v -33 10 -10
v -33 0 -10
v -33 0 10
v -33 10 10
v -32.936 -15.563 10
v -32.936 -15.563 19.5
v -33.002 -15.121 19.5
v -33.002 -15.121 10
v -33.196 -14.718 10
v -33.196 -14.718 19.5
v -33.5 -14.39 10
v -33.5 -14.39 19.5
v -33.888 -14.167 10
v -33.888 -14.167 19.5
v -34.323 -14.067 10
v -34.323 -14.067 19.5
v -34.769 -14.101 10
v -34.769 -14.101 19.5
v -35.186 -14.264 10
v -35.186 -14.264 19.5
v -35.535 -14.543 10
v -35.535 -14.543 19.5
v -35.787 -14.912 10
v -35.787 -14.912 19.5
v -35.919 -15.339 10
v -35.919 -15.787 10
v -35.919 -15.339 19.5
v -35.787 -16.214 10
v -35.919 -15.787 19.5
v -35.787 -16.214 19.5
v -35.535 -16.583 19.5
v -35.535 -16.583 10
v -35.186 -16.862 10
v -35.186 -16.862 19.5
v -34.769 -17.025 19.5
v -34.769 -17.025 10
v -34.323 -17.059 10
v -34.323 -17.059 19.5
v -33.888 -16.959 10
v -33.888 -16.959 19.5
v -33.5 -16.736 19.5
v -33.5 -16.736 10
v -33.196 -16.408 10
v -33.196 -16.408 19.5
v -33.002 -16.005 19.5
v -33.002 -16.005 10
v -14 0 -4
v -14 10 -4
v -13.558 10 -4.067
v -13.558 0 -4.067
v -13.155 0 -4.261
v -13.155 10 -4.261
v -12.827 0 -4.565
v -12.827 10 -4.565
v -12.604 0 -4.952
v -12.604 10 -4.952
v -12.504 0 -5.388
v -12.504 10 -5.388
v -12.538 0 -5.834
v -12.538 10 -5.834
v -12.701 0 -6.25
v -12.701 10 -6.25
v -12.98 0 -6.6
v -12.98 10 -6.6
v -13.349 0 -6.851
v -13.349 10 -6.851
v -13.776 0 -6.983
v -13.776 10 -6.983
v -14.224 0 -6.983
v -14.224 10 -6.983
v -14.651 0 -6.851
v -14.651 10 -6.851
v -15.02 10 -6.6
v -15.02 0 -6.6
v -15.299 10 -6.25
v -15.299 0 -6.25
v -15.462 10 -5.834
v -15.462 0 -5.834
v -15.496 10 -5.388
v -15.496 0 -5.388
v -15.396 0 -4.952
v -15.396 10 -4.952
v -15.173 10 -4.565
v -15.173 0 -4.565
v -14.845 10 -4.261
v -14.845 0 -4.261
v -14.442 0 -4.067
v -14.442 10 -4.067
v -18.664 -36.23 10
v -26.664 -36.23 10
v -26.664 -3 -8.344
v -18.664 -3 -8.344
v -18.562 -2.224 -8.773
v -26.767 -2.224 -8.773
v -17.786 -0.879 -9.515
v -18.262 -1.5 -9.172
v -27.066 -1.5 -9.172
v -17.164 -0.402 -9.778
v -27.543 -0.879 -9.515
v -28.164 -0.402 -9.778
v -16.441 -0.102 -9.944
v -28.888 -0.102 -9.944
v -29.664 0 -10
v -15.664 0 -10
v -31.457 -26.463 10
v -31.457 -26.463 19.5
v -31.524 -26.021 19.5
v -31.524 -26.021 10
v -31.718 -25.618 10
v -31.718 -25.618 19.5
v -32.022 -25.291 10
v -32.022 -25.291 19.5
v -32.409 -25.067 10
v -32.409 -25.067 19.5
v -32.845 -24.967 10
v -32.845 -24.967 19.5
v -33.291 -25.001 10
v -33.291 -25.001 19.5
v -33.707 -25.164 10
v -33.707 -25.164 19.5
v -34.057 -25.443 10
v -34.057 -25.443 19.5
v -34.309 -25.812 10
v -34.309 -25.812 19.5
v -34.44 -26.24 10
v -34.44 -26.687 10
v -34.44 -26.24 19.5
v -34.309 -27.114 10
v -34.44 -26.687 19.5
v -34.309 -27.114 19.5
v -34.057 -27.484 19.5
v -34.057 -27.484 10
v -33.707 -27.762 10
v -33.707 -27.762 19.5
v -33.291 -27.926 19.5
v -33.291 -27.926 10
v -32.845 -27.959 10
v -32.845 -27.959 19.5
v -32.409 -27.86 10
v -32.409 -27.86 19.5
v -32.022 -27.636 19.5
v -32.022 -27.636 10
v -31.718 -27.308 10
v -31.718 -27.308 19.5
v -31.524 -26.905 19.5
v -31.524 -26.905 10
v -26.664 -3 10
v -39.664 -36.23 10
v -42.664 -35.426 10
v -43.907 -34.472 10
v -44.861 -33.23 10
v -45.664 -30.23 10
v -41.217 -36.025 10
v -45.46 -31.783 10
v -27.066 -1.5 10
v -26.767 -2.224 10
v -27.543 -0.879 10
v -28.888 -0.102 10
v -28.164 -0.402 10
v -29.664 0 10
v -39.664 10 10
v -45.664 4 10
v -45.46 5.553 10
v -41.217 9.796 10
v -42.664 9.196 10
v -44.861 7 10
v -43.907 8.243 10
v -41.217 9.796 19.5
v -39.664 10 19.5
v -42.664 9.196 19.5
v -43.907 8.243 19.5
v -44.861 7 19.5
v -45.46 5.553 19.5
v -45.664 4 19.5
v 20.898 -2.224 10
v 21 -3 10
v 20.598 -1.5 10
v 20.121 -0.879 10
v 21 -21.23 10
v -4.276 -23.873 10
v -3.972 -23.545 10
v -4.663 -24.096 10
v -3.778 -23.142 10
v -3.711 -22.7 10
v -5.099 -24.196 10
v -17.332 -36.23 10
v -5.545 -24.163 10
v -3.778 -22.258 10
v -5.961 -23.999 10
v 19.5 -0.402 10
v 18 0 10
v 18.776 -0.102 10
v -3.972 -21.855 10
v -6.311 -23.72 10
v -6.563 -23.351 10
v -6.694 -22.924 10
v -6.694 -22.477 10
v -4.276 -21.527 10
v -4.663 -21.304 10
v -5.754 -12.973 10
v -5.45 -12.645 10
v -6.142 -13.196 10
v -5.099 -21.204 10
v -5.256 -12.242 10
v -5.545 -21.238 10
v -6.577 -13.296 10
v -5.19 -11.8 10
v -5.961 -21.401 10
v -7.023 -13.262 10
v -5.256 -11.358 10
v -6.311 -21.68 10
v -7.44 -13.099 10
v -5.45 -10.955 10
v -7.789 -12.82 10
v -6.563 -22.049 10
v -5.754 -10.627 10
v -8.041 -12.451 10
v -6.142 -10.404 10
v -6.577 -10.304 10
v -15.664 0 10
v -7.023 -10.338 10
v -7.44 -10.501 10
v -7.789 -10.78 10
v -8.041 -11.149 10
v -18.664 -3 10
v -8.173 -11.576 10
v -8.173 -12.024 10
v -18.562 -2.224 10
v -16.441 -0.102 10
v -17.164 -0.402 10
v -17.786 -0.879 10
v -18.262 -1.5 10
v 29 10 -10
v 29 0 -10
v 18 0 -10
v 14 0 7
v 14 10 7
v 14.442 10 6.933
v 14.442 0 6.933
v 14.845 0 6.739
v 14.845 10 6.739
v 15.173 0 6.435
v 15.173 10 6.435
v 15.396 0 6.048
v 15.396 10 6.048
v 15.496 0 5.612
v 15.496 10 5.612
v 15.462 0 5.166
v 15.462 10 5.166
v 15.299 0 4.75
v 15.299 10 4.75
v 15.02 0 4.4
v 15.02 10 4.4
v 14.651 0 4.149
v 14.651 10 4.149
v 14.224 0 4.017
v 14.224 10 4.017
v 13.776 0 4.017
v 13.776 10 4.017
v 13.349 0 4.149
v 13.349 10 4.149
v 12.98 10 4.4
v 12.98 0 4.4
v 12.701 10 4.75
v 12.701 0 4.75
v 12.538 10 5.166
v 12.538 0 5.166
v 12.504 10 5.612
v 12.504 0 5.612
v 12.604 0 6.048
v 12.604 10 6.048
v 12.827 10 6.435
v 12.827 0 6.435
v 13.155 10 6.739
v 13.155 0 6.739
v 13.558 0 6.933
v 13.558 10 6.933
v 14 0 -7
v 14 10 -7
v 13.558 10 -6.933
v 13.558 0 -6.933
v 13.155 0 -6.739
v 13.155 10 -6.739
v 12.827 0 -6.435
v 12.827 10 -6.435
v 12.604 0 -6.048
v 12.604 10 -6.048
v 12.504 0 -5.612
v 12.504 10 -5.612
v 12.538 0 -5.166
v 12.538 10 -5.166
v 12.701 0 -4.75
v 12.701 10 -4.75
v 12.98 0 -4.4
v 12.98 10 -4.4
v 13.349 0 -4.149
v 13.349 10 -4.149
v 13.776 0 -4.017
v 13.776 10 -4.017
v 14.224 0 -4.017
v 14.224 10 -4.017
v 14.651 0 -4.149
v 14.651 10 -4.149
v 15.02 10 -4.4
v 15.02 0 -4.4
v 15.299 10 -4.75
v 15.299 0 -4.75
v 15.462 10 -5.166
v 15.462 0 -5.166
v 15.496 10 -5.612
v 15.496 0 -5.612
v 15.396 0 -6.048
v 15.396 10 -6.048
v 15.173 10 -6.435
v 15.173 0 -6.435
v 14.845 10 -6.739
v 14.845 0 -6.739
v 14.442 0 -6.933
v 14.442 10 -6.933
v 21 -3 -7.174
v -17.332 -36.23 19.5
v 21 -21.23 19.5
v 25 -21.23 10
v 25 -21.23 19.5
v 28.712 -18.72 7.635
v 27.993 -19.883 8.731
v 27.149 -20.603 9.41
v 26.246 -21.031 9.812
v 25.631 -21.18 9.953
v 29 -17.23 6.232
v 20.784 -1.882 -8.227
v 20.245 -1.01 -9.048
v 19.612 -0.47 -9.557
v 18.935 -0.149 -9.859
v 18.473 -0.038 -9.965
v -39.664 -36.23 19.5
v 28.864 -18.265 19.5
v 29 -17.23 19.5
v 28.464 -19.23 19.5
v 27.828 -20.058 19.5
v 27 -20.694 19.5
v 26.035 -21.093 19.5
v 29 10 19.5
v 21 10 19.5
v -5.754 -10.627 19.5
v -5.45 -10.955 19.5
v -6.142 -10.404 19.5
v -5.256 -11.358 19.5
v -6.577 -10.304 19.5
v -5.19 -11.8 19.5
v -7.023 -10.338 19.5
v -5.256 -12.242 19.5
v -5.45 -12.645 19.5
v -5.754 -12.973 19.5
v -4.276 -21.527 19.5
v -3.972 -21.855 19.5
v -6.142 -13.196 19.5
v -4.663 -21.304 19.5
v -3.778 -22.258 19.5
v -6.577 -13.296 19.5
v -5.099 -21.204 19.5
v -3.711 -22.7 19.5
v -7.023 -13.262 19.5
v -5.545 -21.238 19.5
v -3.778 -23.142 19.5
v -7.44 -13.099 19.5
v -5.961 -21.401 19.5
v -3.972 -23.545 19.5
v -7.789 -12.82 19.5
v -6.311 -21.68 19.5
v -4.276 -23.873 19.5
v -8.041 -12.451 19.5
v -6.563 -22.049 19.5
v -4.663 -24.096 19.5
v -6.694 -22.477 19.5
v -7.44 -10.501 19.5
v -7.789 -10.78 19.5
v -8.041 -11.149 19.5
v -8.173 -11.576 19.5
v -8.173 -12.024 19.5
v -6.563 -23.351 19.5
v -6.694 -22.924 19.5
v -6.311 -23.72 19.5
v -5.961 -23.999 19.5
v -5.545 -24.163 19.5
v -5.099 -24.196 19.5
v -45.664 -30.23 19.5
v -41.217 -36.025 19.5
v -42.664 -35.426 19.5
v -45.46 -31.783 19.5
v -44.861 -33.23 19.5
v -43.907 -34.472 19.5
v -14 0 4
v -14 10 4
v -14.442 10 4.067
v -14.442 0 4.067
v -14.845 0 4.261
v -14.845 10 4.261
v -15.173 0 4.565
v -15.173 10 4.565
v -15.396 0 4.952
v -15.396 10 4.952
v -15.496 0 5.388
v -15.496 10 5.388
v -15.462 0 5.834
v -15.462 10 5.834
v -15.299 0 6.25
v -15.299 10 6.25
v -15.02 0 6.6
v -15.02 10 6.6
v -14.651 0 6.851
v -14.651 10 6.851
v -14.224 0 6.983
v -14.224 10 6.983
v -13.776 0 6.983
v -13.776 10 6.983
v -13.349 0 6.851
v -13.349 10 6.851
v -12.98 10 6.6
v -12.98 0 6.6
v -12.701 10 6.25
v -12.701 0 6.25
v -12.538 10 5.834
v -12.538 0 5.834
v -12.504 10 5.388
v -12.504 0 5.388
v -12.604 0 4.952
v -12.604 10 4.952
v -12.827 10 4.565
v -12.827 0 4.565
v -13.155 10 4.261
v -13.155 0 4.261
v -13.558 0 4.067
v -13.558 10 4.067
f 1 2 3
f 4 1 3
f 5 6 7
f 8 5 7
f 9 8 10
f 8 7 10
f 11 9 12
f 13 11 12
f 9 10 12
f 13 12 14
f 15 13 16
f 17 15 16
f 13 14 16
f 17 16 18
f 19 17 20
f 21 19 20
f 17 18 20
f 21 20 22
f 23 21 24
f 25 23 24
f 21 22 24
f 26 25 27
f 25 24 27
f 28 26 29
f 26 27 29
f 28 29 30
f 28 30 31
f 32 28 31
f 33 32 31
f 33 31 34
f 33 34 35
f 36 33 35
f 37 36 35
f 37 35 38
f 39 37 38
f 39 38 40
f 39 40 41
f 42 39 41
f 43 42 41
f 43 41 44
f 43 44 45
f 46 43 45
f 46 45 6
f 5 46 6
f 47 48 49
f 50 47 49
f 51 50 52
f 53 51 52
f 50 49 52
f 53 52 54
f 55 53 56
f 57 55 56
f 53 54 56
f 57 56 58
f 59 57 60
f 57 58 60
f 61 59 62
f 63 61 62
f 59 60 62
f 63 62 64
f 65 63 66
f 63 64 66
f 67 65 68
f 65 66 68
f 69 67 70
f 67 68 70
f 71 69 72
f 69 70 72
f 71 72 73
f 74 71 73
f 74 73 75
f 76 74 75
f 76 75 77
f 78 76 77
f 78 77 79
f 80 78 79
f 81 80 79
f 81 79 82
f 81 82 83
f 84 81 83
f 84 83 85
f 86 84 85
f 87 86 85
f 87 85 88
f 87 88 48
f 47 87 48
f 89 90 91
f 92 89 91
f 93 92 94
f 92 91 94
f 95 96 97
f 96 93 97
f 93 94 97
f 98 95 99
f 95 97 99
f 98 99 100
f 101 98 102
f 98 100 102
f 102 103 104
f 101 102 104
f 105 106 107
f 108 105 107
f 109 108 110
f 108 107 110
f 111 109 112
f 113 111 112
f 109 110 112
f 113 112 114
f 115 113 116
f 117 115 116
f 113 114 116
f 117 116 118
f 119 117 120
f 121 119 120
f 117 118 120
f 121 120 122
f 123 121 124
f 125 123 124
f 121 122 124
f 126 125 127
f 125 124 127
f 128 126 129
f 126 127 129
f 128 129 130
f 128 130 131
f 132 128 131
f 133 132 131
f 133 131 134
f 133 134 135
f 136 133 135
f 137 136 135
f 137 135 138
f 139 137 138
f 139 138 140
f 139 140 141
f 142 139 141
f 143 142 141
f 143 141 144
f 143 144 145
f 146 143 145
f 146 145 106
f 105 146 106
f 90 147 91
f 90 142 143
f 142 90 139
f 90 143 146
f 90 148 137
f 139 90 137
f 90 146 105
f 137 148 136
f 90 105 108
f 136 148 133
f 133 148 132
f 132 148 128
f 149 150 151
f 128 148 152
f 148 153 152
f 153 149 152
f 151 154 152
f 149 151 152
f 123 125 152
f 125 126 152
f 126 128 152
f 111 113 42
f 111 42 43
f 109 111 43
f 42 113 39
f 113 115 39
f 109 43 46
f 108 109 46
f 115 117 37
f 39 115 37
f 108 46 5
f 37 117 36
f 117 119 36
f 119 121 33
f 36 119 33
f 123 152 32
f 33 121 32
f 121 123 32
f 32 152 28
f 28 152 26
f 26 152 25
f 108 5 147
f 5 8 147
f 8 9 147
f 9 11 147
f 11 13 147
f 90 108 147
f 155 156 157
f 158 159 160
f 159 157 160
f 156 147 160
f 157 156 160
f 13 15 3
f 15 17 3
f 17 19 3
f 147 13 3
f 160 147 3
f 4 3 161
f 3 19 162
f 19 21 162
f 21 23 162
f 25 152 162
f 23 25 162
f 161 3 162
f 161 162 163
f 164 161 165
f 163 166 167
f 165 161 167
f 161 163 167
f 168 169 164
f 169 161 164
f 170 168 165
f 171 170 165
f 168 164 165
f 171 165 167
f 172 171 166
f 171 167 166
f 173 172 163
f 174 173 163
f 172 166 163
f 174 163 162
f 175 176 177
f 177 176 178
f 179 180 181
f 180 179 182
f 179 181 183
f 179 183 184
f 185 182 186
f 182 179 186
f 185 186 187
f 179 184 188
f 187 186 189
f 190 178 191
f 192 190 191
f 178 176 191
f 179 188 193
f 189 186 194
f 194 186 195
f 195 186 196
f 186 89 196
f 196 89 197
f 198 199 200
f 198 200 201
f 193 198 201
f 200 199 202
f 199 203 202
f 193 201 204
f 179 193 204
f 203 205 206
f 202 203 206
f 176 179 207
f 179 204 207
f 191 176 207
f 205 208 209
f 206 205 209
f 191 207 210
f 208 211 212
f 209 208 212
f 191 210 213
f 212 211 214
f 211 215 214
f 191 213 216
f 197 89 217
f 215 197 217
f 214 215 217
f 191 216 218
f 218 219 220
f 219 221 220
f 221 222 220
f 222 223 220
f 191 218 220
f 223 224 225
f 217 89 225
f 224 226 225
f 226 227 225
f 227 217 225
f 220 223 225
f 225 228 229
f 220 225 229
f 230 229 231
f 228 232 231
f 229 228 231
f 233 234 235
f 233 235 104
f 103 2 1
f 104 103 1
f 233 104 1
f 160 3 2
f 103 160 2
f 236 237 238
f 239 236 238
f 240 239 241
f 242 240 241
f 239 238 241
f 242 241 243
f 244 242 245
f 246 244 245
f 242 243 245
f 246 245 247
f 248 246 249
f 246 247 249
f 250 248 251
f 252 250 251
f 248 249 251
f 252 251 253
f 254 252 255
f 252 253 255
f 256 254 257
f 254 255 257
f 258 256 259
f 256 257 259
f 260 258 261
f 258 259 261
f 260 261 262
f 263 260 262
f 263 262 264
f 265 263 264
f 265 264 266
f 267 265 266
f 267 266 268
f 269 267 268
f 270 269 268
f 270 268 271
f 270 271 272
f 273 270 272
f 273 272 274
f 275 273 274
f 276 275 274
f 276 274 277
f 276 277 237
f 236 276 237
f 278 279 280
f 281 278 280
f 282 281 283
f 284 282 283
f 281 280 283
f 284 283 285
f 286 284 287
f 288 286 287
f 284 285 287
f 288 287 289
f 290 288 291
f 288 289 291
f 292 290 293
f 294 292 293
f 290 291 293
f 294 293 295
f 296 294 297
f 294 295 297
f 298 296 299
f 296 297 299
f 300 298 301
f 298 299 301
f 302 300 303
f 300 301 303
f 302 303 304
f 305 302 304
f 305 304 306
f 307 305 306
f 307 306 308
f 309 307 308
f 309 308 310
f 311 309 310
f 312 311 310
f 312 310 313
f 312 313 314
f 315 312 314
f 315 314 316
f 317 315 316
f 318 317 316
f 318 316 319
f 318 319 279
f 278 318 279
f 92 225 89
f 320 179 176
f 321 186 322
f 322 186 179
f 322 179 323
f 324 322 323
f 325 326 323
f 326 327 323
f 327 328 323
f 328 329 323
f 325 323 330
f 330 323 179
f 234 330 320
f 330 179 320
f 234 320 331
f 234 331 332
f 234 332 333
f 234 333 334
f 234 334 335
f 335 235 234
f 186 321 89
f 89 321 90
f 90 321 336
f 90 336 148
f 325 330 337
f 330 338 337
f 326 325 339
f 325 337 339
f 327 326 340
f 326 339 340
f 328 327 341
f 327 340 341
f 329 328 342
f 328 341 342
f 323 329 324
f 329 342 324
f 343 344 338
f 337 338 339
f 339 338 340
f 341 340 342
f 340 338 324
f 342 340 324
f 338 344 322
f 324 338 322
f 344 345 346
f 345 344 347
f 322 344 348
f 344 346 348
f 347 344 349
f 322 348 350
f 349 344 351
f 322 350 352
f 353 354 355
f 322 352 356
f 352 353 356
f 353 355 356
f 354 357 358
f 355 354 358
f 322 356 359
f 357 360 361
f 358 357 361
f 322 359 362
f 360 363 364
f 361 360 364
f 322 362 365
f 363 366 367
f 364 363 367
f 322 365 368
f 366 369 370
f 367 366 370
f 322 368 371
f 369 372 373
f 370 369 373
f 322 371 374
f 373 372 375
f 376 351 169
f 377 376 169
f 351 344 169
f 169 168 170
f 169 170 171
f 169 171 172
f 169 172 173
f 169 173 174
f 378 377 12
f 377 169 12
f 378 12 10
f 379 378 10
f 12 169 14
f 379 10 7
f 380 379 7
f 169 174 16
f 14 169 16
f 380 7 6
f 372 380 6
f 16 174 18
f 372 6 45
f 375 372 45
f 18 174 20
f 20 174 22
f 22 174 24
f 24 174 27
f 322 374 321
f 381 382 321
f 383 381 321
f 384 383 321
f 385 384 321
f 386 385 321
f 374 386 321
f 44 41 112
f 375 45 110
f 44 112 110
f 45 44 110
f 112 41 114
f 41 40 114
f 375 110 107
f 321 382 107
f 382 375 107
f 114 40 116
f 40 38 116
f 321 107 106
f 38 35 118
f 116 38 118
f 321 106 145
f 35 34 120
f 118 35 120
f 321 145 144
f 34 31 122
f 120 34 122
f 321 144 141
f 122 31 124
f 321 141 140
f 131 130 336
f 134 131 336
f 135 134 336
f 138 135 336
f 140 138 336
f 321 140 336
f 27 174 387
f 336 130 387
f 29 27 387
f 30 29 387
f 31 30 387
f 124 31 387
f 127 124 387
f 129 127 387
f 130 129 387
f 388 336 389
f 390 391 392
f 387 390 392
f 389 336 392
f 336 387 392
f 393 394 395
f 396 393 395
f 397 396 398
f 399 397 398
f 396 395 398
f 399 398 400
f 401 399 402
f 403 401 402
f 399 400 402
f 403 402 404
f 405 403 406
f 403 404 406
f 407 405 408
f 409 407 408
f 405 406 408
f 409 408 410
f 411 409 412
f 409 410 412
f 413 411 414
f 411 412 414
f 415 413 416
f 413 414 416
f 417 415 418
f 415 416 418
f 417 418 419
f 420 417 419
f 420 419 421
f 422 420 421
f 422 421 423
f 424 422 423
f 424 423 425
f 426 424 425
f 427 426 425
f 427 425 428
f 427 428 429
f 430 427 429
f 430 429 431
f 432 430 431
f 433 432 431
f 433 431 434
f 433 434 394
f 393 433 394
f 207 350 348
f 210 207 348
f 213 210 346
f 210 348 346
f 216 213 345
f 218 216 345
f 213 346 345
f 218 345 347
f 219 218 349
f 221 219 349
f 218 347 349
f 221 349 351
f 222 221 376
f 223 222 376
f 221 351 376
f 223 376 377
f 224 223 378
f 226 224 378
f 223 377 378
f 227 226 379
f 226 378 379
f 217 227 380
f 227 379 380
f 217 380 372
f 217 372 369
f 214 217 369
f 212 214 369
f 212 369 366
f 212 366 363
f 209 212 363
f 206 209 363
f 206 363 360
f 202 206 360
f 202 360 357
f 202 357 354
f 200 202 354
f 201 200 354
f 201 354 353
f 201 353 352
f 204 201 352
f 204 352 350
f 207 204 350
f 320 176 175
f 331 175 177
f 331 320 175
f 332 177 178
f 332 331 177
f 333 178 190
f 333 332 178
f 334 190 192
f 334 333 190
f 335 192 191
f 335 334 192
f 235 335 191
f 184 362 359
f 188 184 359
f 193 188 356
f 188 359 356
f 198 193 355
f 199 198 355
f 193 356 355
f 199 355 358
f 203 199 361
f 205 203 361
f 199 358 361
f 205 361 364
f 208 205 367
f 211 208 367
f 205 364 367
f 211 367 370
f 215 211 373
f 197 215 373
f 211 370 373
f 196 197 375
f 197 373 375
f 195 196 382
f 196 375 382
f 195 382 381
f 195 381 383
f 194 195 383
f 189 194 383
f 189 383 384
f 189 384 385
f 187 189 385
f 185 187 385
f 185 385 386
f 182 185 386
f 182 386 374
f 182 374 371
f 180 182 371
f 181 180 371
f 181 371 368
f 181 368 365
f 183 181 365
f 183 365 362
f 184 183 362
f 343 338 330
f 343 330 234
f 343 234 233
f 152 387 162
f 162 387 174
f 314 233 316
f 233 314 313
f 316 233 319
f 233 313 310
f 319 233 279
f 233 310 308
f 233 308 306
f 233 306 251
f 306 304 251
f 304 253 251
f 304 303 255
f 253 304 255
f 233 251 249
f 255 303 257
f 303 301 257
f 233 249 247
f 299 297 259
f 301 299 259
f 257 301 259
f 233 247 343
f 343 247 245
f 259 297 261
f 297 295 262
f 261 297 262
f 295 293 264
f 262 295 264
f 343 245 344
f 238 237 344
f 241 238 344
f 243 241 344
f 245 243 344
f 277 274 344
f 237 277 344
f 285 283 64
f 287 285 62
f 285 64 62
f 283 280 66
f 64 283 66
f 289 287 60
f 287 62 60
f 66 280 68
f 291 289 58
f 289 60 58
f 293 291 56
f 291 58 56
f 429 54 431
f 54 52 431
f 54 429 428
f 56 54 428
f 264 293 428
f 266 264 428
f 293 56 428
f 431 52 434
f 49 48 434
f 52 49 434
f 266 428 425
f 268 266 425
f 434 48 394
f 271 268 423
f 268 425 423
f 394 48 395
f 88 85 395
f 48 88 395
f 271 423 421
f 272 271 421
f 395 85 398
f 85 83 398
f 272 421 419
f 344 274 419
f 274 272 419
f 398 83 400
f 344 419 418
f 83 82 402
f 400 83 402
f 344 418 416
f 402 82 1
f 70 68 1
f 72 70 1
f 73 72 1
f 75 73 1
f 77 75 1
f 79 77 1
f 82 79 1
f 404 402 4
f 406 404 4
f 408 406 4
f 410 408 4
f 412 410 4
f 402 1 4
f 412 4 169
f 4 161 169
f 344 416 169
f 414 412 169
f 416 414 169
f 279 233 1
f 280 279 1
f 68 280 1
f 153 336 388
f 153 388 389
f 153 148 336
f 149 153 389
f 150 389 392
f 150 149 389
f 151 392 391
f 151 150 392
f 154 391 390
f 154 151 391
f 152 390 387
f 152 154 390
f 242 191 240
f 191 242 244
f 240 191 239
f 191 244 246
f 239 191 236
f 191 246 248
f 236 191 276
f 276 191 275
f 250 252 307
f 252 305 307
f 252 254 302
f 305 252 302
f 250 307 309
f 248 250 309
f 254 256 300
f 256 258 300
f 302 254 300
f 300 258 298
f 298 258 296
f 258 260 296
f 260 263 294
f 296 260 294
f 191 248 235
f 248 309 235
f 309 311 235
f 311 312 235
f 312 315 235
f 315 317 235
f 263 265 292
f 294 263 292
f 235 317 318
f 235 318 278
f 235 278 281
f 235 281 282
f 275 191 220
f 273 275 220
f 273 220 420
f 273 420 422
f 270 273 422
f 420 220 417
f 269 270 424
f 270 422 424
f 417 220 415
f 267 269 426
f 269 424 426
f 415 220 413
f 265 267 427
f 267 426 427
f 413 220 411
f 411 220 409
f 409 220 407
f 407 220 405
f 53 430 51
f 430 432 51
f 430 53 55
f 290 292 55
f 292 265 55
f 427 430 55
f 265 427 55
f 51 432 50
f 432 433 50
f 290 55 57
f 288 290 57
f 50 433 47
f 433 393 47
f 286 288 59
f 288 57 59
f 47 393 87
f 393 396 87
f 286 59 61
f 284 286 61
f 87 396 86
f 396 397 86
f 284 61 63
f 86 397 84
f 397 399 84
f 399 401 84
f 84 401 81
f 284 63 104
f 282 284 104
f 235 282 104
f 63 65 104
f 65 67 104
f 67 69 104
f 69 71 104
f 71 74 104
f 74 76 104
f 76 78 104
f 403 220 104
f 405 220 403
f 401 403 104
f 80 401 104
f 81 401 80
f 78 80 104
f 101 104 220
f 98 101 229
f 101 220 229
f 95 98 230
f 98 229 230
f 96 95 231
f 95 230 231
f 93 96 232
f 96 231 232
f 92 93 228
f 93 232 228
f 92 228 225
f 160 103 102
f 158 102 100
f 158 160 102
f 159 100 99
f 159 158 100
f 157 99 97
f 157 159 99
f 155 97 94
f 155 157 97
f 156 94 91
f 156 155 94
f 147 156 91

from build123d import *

# Parameters (mm, degrees)
SKETCH_1_W               = 42
SKETCH_1_H               = 20
EXTRUDE_1_DEPTH          = 10
SKETCH_2_R               = 1.5
CUT_EXTRUDE_1_DEPTH      = 26.317977802
SKETCH_3_W               = 12
SKETCH_3_H               = 20
EXTRUDE_2_DEPTH          = 10
SKETCH_4_W               = 126.664391462
SKETCH_4_H               = 46.229783625
EXTRUDE_3_DEPTH          = 9.5
SKETCH_5_R               = 1.5
CUT_EXTRUDE_2_DEPTH      = 116.532726292
SKETCH_6_W               = 60
SKETCH_6_H               = 46.229783625
CUT_EXTRUDE_3_DEPTH      = 116.532726292
EXTRUDE_4_DEPTH          = 8
CUT_EXTRUDE_4_DEPTH      = 66.33057377
CUT_EXTRUDE_4_DEPTH_BACK = 66.33057377
RIB_1_REACH              = 87.25
SKETCH_10_WALL_W         = 201.667483308
SKETCH_10_WALL_H         = 8
CUT_EXTRUDE_5_DEPTH      = 62.626567883
EXTRUDE_5_DEPTH          = 8
FILLET_1_R               = 3
FILLET_2_R               = 4
FILLET_3_R               = 6


with BuildPart() as part:
    # 草图1 → 凸台-拉伸1 (new body)
    with BuildSketch(Plane(origin=(0, 0, 0), x_dir=(1, 0, 0), z_dir=(0, 1, 0))):
        Rectangle(SKETCH_1_W, SKETCH_1_H)
    extrude(amount=EXTRUDE_1_DEPTH)

    # 草图2 → 切除-拉伸1 (cut, through all)
    with BuildSketch(Plane(origin=(0, 10, 0), x_dir=(1, 0, 0), z_dir=(0, 1, 0))):
        with Locations(Location((-14, 5.5, 0), (0, 0, 270))):
            Circle(SKETCH_2_R)
        with Locations(Location((14, 5.5, 0), (0, 0, 90))):
            Circle(SKETCH_2_R)
        with Locations(Location((14, -5.5, 0), (0, 0, 270))):
            Circle(SKETCH_2_R)
        with Locations(Location((-14, -5.5, 0), (0, 0, 90))):
            Circle(SKETCH_2_R)
    extrude(amount=-CUT_EXTRUDE_1_DEPTH, mode=Mode.SUBTRACT)

    # 草图3 → 凸台-拉伸2 (add)
    with BuildSketch(Plane.XZ):
        with Locations((-27, 0)):
            Rectangle(SKETCH_3_W, SKETCH_3_H)
    extrude(amount=-EXTRUDE_2_DEPTH)

    # 草图4 → 凸台-拉伸3 (add)
    with BuildSketch(Plane.XY.offset(10)):
        with Locations((-42.332195731, -13.114891813)):
            Rectangle(SKETCH_4_W, SKETCH_4_H)
    extrude(amount=EXTRUDE_3_DEPTH)

    # 草图5 → 切除-拉伸2 (cut, through all)
    with BuildSketch(Plane.XY.offset(19.5)):
        with Locations((-34.435554727, -15.563062213)):
            Circle(SKETCH_5_R)
        with Locations((-6.689582963, -11.799945041)):
            Circle(SKETCH_5_R)
        with Locations((-5.211215503, -22.700148234)):
            Circle(SKETCH_5_R)
        with Locations((-32.957187267, -26.463265406)):
            Circle(SKETCH_5_R)
    extrude(amount=-CUT_EXTRUDE_2_DEPTH, mode=Mode.SUBTRACT)

    # 草图6 → 切除-拉伸3 (cut, through all)
    with BuildSketch(Plane.XY.offset(19.5)):
        with Locations((-75.664391462, -13.114891813)):
            Rectangle(SKETCH_6_W, SKETCH_6_H)
    extrude(amount=-CUT_EXTRUDE_3_DEPTH, mode=Mode.SUBTRACT)

    # 草图8 → 凸台-拉伸4 (add)
    with BuildSketch(Plane(origin=(21, 0, 0), x_dir=(0, 0, -1), z_dir=(1, 0, 0))):
        Polygon((-10, 0), (10, 0), (10, 10), (-19.5, 10), (-19.5, -36.229783625), (-10, -36.229783625), align=None)
    extrude(amount=EXTRUDE_4_DEPTH)

    # 草图9 → 切除-拉伸4 (cut, two sides: drawn at the far end of the back side and taken through both)
    with BuildSketch(Plane.XY.offset(19.5).offset(-CUT_EXTRUDE_4_DEPTH_BACK)):
        Polygon((29, -21.229783625), (-8.332195731, -36.229783625), (29, -36.229783625), align=None)
    extrude(amount=CUT_EXTRUDE_4_DEPTH + CUT_EXTRUDE_4_DEPTH_BACK, mode=Mode.SUBTRACT)

    # 草图10 wall → 筋1 (add, up to next)
    with BuildSketch(Plane(origin=(29, -10.614891812, 0), x_dir=(0, 0.727874330628, -0.685710550315), z_dir=(0, 0.685710550315, 0.727874330628)), mode=Mode.PRIVATE) as rib_1_sk1:
        with Locations((0, 4)):
            Rectangle(SKETCH_10_WALL_W, SKETCH_10_WALL_H)
    rib_1_tool1 = extrude(rib_1_sk1.sketch, amount=RIB_1_REACH, mode=Mode.PRIVATE) - part.part
    add(rib_1_tool1.solids().sort_by_distance((29, -10.614891812, 0))[0])

    # 草图12 → 切除-拉伸5 (cut, through all)
    with BuildSketch(Plane(origin=(0, 0, 10), x_dir=(-1, 0, 0), z_dir=(0, 0, -1))):
        Polygon((17.332195731, -36.229783625), (-21, -21.229783625), (-29, -21.229783625), (8.332195731, -36.229783625), align=None)
    extrude(amount=-CUT_EXTRUDE_5_DEPTH, mode=Mode.SUBTRACT)

    # 草图13 → 凸台-拉伸5 (add)
    with BuildSketch(Plane(origin=(-26.664391462, 0, 0), x_dir=(0, 0, -1), z_dir=(1, 0, 0))):
        Polygon((-10, -36.229783625), (10, 0), (-10, 0), align=None)
    extrude(amount=EXTRUDE_5_DEPTH)

    # 圆角1
    fillet_1_edges = [part.edges().sort_by_distance(p)[0] for p in [
        (21, 0, 0),
        (-26.664391462, 0, 0),
        (-18.664391462, 0, 0),
    ]]
    fillet(fillet_1_edges, radius=FILLET_1_R)

    # 圆角2
    fillet_2_edges = [part.edges().sort_by_distance(p)[0] for p in [
        (29, -21.229783625, 14.75),
    ]]
    fillet(fillet_2_edges, radius=FILLET_2_R)

    # 圆角3
    fillet_3_edges = [part.edges().sort_by_distance(p)[0] for p in [
        (-45.664391462, 10, 14.75),
        (-45.664391462, -36.229783625, 14.75),
    ]]
    fillet(fillet_3_edges, radius=FILLET_3_R)


solid = part.part
